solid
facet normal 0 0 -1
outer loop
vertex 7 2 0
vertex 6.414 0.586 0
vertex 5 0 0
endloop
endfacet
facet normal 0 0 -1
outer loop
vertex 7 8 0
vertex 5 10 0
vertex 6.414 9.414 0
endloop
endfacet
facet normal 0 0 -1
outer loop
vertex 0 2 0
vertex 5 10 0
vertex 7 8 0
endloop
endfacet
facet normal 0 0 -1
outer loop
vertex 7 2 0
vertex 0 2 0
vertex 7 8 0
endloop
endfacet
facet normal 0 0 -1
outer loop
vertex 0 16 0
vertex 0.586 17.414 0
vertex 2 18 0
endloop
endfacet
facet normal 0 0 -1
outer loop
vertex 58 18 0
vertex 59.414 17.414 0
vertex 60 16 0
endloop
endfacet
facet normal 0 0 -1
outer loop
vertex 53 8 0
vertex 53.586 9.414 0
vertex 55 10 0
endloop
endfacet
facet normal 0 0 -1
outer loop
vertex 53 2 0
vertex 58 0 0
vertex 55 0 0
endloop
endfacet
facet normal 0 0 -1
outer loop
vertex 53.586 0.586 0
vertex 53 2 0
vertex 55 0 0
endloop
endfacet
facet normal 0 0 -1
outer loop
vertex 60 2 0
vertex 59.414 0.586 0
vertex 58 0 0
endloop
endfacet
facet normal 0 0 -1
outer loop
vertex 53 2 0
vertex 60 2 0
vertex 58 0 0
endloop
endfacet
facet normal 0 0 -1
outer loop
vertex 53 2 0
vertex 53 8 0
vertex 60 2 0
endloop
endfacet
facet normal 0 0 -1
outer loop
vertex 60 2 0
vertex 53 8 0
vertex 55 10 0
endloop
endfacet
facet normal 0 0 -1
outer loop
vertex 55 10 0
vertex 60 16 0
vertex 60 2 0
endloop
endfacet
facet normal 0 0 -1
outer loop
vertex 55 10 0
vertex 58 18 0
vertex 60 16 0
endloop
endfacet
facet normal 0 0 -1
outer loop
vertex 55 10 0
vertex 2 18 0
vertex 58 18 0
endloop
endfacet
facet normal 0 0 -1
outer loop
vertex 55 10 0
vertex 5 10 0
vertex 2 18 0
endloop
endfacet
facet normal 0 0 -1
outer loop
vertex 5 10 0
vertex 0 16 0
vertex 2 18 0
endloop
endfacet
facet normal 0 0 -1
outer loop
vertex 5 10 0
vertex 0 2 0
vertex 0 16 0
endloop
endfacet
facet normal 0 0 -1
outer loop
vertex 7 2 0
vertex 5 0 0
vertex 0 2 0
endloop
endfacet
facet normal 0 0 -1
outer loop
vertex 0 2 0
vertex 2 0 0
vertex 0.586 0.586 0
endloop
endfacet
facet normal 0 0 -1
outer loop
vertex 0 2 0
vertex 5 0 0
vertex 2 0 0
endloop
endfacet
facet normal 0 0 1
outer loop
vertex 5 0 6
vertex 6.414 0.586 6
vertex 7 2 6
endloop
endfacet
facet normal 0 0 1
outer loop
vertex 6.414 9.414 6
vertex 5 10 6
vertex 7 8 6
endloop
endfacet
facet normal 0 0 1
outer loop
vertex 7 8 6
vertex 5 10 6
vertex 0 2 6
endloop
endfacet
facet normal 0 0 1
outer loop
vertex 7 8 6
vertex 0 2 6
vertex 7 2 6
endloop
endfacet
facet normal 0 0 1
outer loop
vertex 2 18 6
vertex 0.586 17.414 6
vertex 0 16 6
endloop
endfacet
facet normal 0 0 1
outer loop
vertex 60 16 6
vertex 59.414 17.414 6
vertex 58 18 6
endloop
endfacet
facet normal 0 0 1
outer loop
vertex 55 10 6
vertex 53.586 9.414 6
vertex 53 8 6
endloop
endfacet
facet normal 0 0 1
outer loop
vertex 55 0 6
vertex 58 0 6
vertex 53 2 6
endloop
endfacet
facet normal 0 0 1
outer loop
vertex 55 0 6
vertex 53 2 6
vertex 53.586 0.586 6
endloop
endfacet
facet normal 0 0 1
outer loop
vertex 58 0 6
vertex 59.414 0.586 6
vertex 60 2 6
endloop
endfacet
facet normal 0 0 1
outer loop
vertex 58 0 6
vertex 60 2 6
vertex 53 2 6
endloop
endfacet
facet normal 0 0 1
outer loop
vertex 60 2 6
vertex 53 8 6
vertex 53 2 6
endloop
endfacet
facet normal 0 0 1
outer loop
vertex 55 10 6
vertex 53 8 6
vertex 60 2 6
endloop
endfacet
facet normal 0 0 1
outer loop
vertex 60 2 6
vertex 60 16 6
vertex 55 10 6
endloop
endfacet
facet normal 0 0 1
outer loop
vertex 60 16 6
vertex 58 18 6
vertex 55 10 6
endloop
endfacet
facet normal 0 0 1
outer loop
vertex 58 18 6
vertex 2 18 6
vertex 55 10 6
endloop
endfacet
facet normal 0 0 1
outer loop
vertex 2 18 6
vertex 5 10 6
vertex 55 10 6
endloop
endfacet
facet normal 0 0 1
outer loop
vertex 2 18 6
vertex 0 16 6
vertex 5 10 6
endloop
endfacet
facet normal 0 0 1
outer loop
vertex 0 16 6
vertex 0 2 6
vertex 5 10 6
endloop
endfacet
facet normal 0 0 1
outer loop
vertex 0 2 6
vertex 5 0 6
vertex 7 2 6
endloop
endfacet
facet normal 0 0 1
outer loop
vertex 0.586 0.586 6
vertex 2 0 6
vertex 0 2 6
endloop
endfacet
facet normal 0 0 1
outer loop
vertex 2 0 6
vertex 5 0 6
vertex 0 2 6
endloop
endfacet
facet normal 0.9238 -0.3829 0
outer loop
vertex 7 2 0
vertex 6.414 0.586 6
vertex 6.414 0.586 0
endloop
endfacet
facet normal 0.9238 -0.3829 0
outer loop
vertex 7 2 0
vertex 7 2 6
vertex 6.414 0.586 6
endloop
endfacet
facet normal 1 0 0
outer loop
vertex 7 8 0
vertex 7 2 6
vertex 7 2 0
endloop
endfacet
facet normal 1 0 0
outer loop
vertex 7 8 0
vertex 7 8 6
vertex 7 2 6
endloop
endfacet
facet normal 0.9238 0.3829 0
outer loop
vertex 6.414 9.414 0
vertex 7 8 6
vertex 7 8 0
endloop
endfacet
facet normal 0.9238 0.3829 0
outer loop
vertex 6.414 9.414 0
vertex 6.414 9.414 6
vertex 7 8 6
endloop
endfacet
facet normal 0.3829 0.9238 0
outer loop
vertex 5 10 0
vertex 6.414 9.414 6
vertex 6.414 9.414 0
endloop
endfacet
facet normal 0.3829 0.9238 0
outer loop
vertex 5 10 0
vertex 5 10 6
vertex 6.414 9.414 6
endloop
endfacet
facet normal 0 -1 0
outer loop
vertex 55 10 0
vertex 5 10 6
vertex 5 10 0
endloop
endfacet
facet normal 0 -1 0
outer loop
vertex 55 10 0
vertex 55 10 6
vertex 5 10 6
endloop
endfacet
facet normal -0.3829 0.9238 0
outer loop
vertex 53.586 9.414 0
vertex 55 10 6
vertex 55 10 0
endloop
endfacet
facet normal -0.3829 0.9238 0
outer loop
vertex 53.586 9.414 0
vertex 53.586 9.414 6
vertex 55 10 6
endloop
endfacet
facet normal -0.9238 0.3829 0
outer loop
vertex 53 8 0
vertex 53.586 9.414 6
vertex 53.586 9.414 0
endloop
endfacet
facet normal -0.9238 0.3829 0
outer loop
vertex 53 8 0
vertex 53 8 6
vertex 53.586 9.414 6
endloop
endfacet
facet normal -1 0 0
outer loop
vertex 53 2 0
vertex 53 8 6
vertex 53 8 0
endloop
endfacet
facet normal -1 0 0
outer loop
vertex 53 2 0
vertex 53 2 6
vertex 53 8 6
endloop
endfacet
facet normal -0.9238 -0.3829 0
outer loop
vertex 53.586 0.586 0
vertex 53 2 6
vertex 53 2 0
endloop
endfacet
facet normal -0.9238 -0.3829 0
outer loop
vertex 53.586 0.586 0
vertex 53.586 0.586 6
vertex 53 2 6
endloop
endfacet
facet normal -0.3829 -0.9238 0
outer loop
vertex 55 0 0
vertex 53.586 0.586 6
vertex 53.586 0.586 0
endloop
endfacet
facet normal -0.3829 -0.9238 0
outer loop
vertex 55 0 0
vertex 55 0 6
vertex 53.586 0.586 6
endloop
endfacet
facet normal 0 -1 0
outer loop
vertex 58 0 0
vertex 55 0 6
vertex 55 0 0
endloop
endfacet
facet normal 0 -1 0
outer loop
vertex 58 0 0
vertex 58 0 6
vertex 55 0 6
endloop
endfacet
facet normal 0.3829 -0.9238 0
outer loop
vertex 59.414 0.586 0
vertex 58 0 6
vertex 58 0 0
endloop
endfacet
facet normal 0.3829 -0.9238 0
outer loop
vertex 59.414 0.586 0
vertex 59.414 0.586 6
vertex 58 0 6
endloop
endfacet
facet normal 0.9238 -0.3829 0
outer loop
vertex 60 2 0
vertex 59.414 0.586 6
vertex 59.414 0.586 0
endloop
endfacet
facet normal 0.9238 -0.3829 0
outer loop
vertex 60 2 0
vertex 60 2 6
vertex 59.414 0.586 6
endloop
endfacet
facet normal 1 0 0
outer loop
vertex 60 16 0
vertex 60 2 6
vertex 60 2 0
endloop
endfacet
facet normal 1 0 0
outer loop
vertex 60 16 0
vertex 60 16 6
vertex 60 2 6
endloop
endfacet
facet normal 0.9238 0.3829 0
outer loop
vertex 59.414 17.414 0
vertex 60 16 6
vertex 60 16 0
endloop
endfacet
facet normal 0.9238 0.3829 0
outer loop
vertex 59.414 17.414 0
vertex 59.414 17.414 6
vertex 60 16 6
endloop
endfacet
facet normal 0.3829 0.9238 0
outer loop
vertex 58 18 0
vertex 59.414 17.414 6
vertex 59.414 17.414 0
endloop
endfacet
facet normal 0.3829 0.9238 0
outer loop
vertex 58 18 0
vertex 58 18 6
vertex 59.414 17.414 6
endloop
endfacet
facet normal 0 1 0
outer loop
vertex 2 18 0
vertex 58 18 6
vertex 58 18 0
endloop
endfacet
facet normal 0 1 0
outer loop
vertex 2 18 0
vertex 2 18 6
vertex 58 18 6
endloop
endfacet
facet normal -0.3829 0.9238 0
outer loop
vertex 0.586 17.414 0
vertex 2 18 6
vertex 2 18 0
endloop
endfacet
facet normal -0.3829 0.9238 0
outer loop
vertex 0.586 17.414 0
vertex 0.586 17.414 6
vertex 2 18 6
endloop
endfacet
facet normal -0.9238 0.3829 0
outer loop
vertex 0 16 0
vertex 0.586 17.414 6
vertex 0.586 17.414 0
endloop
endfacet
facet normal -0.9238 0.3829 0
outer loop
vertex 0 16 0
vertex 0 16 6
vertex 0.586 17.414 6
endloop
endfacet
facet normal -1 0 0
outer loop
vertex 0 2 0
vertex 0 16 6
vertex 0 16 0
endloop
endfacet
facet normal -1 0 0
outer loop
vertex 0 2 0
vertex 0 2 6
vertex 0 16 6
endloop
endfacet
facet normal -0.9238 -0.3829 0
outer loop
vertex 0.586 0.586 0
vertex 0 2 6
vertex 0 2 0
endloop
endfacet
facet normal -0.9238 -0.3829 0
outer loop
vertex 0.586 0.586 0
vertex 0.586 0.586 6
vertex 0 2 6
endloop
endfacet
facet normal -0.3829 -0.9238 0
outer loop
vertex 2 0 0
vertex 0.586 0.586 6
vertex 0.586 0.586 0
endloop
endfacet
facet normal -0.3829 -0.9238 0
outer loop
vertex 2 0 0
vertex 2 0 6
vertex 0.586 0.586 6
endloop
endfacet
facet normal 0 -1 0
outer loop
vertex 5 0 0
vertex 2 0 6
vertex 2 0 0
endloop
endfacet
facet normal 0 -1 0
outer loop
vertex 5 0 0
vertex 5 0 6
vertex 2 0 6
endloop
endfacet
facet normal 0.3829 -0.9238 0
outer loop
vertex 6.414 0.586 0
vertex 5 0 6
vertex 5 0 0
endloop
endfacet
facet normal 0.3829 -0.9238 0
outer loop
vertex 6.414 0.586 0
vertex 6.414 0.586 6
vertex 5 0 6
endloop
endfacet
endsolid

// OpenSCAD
$fn = 32;

// ----------------------------------------------------------------------
// Clip blank: staple clip, 6 mm thick
// ----------------------------------------------------------------------

// --- parameters (mm) ---
profile_height = 6;       // extrusion height
profile_points = 24;      // points of the closed outline

profile = [[0, 2], [0.586, 0.586], [2, 0], [5, 0], [6.414, 0.586], [7, 2], [7, 8], [6.414, 9.414], [5, 10], [55, 10], [53.586, 9.414], [53, 8], [53, 2], [53.586, 0.586], [55, 0], [58, 0], [59.414, 0.586], [60, 2], [60, 16], [59.414, 17.414], [58, 18], [2, 18], [0.586, 17.414], [0, 16]];  // single closed polygon, 24 points, counter clockwise

// --- the one profile operation ---
linear_extrude(height = profile_height) polygon(points = profile);
